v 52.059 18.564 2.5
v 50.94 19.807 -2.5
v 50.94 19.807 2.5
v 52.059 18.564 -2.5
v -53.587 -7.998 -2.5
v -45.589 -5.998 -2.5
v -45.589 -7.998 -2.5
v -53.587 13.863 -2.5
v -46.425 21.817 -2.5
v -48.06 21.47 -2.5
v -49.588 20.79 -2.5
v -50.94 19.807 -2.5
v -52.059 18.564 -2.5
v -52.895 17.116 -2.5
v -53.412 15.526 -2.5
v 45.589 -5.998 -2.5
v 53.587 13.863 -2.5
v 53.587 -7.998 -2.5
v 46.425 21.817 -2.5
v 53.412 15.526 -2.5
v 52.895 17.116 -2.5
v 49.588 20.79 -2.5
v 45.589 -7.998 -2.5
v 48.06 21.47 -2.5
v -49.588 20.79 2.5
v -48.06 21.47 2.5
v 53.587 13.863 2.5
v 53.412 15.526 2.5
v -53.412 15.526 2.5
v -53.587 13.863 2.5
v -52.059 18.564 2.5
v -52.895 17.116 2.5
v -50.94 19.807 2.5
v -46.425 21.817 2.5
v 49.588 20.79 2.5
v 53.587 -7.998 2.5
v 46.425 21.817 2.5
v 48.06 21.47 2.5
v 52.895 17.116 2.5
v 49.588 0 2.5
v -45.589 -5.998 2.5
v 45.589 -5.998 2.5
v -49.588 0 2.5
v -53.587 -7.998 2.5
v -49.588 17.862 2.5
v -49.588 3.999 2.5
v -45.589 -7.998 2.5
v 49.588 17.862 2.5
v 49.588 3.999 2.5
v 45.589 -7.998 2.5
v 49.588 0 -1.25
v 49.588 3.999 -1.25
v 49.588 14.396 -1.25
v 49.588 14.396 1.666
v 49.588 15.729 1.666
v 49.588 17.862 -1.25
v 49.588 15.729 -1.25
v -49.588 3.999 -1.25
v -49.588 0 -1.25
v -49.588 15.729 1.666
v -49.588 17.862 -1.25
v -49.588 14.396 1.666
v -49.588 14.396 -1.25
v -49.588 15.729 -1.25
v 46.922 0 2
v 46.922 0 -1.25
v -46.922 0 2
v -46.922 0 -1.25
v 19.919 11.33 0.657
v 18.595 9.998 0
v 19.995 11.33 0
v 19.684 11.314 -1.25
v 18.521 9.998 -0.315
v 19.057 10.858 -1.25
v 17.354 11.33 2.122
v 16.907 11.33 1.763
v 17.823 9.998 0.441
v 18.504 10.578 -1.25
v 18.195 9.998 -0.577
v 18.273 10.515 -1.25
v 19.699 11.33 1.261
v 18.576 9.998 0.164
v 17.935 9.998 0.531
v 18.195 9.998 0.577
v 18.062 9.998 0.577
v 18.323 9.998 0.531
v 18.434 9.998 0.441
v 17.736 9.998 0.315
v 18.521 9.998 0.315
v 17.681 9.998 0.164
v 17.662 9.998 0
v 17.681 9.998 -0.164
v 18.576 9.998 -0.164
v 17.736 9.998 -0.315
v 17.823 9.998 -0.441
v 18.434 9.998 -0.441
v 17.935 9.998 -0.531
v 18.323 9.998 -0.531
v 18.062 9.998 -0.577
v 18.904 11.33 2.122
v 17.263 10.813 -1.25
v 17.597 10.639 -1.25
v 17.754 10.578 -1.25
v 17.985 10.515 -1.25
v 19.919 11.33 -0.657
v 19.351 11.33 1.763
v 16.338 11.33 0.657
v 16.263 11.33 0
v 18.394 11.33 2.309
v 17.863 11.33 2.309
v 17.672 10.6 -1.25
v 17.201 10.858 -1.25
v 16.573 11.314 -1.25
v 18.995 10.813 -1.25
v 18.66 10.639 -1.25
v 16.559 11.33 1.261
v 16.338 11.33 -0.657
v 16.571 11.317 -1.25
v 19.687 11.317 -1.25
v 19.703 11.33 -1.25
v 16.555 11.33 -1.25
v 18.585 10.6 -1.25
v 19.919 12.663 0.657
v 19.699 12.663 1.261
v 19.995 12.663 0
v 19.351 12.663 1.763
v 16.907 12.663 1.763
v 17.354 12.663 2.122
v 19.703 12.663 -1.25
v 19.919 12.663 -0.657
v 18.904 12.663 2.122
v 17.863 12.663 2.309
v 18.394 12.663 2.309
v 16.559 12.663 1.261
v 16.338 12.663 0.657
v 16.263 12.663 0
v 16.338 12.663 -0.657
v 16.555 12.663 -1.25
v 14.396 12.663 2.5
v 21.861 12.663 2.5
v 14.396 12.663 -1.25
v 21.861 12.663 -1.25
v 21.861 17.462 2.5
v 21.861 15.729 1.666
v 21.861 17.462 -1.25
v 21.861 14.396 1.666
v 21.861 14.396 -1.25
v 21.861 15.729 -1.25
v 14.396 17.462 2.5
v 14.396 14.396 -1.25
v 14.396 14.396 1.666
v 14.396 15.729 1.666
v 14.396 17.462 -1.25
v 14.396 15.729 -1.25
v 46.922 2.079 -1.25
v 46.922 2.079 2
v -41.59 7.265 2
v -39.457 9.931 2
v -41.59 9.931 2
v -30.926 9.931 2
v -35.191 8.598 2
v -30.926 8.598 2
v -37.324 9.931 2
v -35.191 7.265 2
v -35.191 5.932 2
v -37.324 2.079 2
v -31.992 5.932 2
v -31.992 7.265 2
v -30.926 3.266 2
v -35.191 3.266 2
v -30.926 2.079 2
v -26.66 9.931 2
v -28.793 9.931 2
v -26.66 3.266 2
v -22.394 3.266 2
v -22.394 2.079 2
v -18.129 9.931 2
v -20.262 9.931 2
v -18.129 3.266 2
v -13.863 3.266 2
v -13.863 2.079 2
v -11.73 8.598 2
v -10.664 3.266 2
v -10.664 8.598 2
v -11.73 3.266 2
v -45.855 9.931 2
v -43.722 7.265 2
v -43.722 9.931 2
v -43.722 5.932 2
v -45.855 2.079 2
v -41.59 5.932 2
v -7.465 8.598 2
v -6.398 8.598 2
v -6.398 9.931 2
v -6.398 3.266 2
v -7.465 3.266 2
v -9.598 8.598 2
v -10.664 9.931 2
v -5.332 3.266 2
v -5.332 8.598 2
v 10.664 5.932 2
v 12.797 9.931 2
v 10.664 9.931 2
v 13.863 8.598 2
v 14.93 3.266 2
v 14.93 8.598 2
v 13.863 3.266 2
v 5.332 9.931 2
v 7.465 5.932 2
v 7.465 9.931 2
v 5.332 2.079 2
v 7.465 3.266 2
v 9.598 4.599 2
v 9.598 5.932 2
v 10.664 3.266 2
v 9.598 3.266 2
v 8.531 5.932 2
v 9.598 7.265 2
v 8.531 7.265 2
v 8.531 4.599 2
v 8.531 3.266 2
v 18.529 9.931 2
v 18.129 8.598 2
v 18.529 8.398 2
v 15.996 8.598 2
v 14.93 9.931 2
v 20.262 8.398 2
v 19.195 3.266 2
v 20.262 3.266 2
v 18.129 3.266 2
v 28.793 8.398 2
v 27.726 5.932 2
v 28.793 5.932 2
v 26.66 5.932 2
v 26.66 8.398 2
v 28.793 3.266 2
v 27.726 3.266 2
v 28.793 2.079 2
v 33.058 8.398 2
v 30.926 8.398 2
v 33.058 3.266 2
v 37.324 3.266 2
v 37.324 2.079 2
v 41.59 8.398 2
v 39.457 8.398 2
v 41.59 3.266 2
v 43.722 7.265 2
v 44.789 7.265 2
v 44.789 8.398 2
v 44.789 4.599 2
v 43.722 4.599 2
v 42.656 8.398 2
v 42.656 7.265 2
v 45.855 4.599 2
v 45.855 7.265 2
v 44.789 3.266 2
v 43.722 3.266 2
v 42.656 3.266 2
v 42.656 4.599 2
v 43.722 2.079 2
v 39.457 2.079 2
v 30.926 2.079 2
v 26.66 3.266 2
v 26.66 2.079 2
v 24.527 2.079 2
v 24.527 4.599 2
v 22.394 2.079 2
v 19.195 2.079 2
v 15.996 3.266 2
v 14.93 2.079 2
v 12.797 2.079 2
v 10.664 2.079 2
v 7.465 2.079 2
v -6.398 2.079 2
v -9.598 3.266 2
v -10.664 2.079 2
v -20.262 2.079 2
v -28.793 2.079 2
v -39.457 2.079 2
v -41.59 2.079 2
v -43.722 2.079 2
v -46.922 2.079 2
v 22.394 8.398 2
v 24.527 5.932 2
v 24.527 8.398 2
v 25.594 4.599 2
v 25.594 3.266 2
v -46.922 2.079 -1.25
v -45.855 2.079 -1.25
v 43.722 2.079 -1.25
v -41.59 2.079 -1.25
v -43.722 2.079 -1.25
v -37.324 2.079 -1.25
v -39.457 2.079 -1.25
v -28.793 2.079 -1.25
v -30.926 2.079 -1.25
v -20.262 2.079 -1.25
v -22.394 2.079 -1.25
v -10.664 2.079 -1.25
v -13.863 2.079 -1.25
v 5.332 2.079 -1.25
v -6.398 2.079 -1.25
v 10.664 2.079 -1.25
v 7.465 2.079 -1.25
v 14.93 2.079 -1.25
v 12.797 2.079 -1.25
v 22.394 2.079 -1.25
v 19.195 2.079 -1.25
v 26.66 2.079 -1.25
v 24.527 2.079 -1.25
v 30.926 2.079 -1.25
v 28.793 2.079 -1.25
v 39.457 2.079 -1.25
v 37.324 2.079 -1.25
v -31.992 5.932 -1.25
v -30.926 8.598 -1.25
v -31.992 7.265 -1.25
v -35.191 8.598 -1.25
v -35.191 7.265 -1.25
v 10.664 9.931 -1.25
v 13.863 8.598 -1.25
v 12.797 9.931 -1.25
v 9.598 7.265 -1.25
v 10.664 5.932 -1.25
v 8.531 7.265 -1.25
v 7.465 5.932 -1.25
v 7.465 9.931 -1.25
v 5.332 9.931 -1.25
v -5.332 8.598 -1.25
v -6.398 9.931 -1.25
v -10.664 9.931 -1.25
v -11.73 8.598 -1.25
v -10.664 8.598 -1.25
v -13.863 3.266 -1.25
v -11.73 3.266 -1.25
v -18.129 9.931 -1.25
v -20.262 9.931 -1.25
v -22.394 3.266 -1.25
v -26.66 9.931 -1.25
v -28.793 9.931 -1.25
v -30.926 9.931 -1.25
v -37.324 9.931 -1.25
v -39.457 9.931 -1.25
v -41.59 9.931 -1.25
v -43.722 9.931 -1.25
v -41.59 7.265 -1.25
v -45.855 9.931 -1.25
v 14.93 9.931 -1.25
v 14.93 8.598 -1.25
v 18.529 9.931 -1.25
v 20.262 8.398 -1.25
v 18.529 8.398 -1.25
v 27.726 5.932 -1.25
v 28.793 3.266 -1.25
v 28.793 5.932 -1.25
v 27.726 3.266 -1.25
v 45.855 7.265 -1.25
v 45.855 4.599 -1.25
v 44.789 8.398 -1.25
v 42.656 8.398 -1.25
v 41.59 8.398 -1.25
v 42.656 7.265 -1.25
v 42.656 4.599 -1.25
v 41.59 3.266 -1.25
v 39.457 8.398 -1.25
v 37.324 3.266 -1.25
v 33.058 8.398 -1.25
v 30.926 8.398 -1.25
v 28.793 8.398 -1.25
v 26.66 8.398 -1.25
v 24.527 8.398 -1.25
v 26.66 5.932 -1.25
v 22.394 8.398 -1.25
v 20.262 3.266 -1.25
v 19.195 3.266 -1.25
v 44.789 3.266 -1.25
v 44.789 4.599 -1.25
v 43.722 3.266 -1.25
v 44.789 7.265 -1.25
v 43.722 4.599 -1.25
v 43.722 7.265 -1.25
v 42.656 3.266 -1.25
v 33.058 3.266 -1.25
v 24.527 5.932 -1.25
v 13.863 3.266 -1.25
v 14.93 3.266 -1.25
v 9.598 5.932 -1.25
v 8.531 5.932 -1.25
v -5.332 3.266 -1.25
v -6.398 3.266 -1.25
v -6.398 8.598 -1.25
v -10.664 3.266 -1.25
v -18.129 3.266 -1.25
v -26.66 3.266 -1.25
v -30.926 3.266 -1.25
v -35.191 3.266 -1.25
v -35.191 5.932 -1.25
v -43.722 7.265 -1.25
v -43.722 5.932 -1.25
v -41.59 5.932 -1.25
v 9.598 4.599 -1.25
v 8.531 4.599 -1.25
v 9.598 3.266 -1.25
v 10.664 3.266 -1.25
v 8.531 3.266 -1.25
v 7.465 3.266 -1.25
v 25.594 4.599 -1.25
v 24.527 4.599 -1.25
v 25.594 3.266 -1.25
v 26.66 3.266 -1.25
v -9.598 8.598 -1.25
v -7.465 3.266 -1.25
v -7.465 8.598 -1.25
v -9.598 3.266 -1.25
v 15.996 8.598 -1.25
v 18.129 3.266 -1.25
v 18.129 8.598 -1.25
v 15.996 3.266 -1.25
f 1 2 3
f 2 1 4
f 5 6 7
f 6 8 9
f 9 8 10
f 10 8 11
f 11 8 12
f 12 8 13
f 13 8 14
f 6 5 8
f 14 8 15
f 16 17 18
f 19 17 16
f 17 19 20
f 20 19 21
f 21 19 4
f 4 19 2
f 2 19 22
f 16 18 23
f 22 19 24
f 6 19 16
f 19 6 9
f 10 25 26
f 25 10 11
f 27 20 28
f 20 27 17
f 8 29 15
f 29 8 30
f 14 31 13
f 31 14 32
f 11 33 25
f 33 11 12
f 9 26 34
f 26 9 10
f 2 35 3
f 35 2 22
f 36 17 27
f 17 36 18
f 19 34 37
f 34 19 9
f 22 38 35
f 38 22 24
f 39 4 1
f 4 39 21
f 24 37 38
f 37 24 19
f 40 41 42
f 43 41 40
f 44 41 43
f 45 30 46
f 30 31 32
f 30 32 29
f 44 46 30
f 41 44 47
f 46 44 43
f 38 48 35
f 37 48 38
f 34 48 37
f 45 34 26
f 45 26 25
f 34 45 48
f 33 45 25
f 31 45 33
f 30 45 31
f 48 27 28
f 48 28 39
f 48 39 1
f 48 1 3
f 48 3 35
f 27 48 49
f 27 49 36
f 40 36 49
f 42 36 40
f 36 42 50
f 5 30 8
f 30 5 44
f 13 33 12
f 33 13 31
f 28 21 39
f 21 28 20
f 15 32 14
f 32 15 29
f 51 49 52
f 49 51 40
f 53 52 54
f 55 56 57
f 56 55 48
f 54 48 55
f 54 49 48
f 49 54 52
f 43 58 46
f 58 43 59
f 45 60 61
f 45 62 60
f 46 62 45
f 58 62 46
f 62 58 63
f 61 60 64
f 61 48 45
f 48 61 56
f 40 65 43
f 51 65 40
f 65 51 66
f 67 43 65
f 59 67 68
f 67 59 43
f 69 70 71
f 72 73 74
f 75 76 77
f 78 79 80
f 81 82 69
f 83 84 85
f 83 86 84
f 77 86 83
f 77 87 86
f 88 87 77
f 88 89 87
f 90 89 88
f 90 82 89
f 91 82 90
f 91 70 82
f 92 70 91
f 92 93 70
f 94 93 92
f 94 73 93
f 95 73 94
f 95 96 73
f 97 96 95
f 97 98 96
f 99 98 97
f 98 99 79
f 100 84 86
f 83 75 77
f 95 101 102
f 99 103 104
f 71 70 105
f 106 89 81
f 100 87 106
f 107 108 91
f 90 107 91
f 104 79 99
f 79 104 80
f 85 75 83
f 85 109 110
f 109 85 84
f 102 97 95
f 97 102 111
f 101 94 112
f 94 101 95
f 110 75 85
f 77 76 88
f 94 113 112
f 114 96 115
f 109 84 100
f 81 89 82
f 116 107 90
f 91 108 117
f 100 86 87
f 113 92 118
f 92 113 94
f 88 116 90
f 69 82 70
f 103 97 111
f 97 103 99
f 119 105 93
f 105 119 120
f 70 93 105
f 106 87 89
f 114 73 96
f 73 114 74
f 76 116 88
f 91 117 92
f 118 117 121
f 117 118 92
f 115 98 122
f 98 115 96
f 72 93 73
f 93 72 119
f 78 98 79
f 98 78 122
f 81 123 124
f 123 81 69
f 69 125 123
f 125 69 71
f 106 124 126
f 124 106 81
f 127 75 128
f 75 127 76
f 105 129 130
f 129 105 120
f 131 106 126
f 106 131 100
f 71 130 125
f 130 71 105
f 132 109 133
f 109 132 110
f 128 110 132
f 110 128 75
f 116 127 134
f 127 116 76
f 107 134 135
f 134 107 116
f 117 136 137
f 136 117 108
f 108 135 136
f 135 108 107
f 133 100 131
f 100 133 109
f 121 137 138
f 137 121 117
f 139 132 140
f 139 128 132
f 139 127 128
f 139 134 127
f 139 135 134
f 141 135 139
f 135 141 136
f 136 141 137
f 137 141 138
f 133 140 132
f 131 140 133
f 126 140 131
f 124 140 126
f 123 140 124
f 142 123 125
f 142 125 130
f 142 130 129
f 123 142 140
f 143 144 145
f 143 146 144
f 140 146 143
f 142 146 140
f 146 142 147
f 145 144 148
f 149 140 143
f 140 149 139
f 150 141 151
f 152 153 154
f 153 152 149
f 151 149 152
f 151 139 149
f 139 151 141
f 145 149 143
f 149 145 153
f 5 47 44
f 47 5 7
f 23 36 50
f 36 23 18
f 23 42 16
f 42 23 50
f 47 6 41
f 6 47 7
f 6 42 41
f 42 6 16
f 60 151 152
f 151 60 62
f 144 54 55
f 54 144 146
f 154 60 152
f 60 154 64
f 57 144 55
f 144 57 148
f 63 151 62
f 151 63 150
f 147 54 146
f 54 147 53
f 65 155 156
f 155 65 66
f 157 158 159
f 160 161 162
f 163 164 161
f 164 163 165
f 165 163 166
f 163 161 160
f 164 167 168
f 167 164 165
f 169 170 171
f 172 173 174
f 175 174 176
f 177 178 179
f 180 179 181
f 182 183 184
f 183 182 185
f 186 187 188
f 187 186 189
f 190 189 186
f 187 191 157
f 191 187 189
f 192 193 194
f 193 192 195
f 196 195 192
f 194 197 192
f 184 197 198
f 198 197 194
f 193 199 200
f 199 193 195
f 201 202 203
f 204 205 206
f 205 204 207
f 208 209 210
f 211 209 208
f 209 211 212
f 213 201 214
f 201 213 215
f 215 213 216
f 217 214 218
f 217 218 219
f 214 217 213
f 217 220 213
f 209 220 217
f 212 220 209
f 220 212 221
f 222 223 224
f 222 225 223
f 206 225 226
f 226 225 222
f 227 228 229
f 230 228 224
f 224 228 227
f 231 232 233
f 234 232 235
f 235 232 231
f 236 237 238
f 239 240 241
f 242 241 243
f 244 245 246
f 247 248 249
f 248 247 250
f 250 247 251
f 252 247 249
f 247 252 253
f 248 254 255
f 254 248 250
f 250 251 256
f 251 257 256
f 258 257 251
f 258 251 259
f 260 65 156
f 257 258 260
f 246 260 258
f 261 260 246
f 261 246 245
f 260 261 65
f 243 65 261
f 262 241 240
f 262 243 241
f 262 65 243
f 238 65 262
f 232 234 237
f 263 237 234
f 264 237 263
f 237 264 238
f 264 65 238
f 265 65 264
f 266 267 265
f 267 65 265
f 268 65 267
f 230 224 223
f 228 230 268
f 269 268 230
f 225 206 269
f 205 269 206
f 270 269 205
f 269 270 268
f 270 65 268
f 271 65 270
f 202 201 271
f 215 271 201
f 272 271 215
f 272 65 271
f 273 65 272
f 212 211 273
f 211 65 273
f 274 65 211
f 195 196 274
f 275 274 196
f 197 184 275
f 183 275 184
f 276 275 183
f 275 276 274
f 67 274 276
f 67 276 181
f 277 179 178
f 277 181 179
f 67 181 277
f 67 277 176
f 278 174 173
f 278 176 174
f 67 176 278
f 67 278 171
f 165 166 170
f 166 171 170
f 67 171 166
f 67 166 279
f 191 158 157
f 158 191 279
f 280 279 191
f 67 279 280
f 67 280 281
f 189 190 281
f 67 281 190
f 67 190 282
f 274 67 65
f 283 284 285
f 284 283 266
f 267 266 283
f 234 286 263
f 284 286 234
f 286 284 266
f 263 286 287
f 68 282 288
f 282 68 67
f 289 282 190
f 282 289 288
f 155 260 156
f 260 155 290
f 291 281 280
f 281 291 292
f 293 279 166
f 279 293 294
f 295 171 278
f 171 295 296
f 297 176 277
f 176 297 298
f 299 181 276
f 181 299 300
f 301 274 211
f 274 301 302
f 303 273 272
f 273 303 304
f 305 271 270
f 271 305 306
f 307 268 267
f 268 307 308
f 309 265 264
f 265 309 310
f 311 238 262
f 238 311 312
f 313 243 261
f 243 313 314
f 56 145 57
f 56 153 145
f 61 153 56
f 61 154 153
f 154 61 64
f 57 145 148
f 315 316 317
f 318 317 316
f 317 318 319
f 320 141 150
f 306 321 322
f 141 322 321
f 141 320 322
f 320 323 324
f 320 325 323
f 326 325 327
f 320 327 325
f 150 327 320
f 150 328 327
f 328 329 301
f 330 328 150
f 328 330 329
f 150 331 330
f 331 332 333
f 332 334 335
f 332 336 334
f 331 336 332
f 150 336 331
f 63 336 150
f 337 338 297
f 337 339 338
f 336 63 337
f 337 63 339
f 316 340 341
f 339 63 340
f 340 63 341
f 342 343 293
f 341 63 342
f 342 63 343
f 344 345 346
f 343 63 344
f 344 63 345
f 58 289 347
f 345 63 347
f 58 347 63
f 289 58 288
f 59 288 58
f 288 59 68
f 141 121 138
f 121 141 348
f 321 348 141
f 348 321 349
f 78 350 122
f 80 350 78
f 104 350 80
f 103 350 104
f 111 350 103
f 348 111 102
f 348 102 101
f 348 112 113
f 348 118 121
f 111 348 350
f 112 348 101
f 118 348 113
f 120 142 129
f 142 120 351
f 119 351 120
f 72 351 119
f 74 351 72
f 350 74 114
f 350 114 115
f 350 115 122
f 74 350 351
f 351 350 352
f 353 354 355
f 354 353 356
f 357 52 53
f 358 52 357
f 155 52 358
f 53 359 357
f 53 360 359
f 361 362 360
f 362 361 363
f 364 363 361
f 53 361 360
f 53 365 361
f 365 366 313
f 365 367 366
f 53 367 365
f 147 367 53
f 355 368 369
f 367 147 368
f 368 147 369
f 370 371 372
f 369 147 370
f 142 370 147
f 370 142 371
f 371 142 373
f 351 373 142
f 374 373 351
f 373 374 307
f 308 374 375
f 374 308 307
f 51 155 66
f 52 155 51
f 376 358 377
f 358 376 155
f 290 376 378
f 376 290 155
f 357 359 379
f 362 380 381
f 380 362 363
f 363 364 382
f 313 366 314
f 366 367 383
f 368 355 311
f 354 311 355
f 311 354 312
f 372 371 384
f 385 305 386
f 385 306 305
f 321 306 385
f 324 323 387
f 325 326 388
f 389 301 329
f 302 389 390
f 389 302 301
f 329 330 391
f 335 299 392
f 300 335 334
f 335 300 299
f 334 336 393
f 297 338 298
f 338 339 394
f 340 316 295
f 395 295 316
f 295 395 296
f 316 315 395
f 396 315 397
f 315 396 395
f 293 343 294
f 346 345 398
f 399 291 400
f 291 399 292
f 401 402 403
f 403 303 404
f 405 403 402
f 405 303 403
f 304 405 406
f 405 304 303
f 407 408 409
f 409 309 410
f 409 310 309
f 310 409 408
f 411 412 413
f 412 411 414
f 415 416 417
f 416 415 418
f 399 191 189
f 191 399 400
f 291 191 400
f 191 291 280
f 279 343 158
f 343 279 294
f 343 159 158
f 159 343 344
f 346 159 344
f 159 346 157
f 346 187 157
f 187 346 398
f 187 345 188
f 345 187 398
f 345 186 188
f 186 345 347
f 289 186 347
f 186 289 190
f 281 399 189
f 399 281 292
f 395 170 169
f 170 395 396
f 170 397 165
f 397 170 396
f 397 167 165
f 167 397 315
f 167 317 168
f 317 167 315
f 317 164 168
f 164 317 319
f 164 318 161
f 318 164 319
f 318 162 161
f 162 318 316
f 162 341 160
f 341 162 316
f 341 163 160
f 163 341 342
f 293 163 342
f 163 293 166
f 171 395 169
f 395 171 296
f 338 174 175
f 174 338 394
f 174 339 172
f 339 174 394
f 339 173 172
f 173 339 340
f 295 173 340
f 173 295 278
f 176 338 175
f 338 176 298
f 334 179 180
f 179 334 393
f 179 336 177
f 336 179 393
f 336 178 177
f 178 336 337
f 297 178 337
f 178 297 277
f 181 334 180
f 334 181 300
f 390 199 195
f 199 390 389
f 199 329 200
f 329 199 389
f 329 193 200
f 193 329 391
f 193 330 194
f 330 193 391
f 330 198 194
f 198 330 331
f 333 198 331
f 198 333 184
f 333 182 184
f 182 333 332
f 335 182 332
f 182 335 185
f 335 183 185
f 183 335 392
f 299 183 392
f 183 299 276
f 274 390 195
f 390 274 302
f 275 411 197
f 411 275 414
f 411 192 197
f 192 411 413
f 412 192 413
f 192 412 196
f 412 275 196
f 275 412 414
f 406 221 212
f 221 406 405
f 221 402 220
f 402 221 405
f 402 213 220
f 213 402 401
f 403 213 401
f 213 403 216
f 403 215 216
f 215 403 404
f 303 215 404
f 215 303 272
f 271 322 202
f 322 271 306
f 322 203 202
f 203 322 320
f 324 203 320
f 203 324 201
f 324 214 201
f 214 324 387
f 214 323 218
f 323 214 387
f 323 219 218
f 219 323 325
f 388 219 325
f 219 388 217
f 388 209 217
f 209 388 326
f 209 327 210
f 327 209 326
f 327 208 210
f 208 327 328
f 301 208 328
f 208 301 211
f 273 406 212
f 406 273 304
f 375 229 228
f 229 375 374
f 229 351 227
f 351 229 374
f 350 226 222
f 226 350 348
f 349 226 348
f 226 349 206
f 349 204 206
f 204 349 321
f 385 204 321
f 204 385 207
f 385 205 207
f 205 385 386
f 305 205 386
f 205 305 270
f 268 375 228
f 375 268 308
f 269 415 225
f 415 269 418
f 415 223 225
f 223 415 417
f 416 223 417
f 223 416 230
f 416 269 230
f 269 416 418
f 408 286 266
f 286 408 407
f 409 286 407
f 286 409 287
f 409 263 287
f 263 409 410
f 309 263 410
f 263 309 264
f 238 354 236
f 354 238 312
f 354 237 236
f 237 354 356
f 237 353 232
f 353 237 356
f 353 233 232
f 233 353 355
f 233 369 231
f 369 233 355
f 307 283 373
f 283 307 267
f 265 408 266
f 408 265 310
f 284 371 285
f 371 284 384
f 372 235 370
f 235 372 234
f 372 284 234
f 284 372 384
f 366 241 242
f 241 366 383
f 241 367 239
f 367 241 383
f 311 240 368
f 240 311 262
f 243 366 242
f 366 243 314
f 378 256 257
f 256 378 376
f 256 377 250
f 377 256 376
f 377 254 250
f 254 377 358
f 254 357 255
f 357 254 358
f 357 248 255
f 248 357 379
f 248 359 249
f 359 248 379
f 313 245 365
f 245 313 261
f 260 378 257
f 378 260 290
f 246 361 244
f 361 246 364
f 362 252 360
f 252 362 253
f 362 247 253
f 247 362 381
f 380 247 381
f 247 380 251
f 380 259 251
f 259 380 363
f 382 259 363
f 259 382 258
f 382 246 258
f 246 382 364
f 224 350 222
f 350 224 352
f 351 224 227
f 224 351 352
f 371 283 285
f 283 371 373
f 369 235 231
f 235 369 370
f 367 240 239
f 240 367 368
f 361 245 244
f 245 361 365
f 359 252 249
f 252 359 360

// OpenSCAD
// [FL_INDEX: keywords="openscad, 3d_parametric, 3D_Printing_Text_Plate, csg_solid" | COT="Parametric OpenSCAD design from 3DCodeverse"]
// Title: 3D Printing Text Plate

// Copyright 2013 Glen Chung
// This file is licensed Creative Commons Attribution-ShareAlike 3.0.
// http://creativecommons.org/licenses/by-sa/3.0/legalcode

use <MCAD/shapes.scad>
use <MCAD/fonts.scad>

/* [Global] */

//plate thickness
thickness = 15;

//text to be printed (at least one character)
text = "HELLO WORLD";

//horizontal space to plate boundary
text_space = 10;

//extruder x position
extruder_xpos = 68;

//extruder y position
extruder_ypos = 54;  //[25:54]

//nozzle resolution
nozzle_resolution = 6;

//enable hanging hole
enable_hole = 0; //[1:true, 0:false]

//style (hollw or single side)
style = 1; //[0:hollow,1:singleside]

//base style
base_style = 2; //[0:none, 1:solid, 2:foot]

//output
output_style = 2; //[0:text only, 1:plate only, 2:both]

/* [Hidden] */
text_font = 8bit_polyfont();
indicies = search(text,text_font[2],1,1);
width = len(indicies)*32+text_space*2;
height = 67;
round_dia = 30;
rod_height = 5;
rod_thick = 10;
extruder_width = 28;
extruder_height = 18;
extruder_thick = thickness;
nozzle_dia = 7;
nozzle_height = 10;
text_scale = [4,5,3];
build_plate_width = len(indicies)*32;
build_plate_height = 8;
hanging_hole_size = 18;
plate_color = "Grey";
text_color = "Red";
printer_color = "Silver";

scale([0.2666,0.2666,0.3333]) {

if(output_style == 1 || output_style == 2) {
	difference() {
		union() {
			//plate
			translate([0, height/2, 0])
			difference() {
				color(plate_color)
				translate([-(width-round_dia)/2, -(height-round_dia)/2, -thickness/2])
					minkowski()
					{
 						cube([width-round_dia,height-round_dia,thickness/2]);
 						cylinder(r=round_dia,h=thickness/2);
					}

				translate([-(width)/2, -(height)/2, -thickness])
					cube([width,height,thickness*2]);
			}

			//x-rod
			translate([-width/2, extruder_ypos, -rod_thick/2]) color (printer_color)
				cube([width, rod_height, rod_thick]);

			//extruder
			translate([extruder_xpos, 0, 0]) color(printer_color) {
				translate([0,extruder_ypos+rod_height/2, 0])
					translate([-extruder_width/2,-extruder_height/2,-extruder_thick/2])
					cube([extruder_width,extruder_height,extruder_thick]);

				//nozzle
				translate([0,extruder_ypos-extruder_height/2-nozzle_height/4,0])
				rotate([90,0,0]) {
					cylinder(h = nozzle_height/2, r1 = nozzle_dia, r2 = nozzle_dia/4);
					translate([0,0,-nozzle_height/2])
						cylinder(h = nozzle_height/2, r = nozzle_dia);
				}
			}


			//Build Plate
			translate([-build_plate_width/2,-0.2,-thickness/2]) color(printer_color){
				cube([build_plate_width,build_plate_height,thickness*.9]);
			}

			//hanging hole
			if(enable_hole == 1) {
				translate([0,height+round_dia/2-hanging_hole_size/10,-thickness/2])
				color(plate_color) difference() {
					cylinder(h = thickness, r=hanging_hole_size);

					translate([-hanging_hole_size,-hanging_hole_size, -thickness/2])
						cube([hanging_hole_size*2,hanging_hole_size,thickness*2]);

					translate([0,hanging_hole_size/3,-thickness/2])
					cylinder(h = thickness*2, r=hanging_hole_size/4);
				}
			}

			//style
			if(style == 1) { //single side
				translate([-(width)/2, 0, -thickness/2]) color(plate_color)
					cube([width,height,thickness/4]);
			}

			//base
			if(base_style == 1 ) {
				translate([-width/2-round_dia/2,-round_dia,-thickness/2]) color(plate_color) {
					cube([width+round_dia,round_dia,thickness]);
				}
				translate([-width/2-round_dia/2,-round_dia/2,-thickness/2]) color(plate_color) {
					cube([round_dia/2,round_dia,thickness]);
				}
				translate([width/2,-round_dia/2,-thickness/2]) color(plate_color) {
					cube([round_dia/2,round_dia,thickness]);
				}
			}

			if(base_style == 2 ) {
				difference() {
					union() {
						translate([-width/2-round_dia/2,-round_dia,-thickness/2]) color(plate_color) {
							cube([width+round_dia,round_dia,thickness]);
						}
						translate([-width/2-round_dia/2,-round_dia/2,-thickness/2]) color(plate_color) {
							cube([round_dia/2,round_dia,thickness]);
						}
						translate([width/2,-round_dia/2,-thickness/2]) color(plate_color) {
							cube([round_dia/2,round_dia,thickness]);
						}
					}

					translate([-width/2+thickness,-round_dia-round_dia/2-round_dia/4,-thickness])
						cube([width-thickness*2,round_dia,thickness*2]);
				}
			}
		}
		text();
	}
}


//text
if(output_style == 0 || output_style == 2) {
	text();
}

}


module text() {
	difference() {
		union() {
			scale(text_scale)
				translate([-len(indicies)*text_font[0][0]/2,text_font[0][1]/2+.5-.05, -3])
				{
					for(i=[0:(len(indicies)-1)] ) 
						translate([ i*text_font[0][0], -text_font[0][1]/2 ,1]) 
						{
							//color(text_color)
								linear_extrude(height=4) polygon(points=text_font[2][indicies[i]][6][0],paths=text_font[2][indicies[i]][6][1]);
						}
				}
		}

		translate([extruder_xpos+nozzle_resolution/4,extruder_ypos-extruder_height/2-nozzle_height+rod_height/2-nozzle_resolution,-thickness])
			cube([width,height,thickness*2]);
		translate([-width+extruder_xpos+nozzle_resolution/4,extruder_ypos-extruder_height/2-nozzle_height+rod_height/2,-thickness])
			cube([width,height,thickness*2]);
	}
}
